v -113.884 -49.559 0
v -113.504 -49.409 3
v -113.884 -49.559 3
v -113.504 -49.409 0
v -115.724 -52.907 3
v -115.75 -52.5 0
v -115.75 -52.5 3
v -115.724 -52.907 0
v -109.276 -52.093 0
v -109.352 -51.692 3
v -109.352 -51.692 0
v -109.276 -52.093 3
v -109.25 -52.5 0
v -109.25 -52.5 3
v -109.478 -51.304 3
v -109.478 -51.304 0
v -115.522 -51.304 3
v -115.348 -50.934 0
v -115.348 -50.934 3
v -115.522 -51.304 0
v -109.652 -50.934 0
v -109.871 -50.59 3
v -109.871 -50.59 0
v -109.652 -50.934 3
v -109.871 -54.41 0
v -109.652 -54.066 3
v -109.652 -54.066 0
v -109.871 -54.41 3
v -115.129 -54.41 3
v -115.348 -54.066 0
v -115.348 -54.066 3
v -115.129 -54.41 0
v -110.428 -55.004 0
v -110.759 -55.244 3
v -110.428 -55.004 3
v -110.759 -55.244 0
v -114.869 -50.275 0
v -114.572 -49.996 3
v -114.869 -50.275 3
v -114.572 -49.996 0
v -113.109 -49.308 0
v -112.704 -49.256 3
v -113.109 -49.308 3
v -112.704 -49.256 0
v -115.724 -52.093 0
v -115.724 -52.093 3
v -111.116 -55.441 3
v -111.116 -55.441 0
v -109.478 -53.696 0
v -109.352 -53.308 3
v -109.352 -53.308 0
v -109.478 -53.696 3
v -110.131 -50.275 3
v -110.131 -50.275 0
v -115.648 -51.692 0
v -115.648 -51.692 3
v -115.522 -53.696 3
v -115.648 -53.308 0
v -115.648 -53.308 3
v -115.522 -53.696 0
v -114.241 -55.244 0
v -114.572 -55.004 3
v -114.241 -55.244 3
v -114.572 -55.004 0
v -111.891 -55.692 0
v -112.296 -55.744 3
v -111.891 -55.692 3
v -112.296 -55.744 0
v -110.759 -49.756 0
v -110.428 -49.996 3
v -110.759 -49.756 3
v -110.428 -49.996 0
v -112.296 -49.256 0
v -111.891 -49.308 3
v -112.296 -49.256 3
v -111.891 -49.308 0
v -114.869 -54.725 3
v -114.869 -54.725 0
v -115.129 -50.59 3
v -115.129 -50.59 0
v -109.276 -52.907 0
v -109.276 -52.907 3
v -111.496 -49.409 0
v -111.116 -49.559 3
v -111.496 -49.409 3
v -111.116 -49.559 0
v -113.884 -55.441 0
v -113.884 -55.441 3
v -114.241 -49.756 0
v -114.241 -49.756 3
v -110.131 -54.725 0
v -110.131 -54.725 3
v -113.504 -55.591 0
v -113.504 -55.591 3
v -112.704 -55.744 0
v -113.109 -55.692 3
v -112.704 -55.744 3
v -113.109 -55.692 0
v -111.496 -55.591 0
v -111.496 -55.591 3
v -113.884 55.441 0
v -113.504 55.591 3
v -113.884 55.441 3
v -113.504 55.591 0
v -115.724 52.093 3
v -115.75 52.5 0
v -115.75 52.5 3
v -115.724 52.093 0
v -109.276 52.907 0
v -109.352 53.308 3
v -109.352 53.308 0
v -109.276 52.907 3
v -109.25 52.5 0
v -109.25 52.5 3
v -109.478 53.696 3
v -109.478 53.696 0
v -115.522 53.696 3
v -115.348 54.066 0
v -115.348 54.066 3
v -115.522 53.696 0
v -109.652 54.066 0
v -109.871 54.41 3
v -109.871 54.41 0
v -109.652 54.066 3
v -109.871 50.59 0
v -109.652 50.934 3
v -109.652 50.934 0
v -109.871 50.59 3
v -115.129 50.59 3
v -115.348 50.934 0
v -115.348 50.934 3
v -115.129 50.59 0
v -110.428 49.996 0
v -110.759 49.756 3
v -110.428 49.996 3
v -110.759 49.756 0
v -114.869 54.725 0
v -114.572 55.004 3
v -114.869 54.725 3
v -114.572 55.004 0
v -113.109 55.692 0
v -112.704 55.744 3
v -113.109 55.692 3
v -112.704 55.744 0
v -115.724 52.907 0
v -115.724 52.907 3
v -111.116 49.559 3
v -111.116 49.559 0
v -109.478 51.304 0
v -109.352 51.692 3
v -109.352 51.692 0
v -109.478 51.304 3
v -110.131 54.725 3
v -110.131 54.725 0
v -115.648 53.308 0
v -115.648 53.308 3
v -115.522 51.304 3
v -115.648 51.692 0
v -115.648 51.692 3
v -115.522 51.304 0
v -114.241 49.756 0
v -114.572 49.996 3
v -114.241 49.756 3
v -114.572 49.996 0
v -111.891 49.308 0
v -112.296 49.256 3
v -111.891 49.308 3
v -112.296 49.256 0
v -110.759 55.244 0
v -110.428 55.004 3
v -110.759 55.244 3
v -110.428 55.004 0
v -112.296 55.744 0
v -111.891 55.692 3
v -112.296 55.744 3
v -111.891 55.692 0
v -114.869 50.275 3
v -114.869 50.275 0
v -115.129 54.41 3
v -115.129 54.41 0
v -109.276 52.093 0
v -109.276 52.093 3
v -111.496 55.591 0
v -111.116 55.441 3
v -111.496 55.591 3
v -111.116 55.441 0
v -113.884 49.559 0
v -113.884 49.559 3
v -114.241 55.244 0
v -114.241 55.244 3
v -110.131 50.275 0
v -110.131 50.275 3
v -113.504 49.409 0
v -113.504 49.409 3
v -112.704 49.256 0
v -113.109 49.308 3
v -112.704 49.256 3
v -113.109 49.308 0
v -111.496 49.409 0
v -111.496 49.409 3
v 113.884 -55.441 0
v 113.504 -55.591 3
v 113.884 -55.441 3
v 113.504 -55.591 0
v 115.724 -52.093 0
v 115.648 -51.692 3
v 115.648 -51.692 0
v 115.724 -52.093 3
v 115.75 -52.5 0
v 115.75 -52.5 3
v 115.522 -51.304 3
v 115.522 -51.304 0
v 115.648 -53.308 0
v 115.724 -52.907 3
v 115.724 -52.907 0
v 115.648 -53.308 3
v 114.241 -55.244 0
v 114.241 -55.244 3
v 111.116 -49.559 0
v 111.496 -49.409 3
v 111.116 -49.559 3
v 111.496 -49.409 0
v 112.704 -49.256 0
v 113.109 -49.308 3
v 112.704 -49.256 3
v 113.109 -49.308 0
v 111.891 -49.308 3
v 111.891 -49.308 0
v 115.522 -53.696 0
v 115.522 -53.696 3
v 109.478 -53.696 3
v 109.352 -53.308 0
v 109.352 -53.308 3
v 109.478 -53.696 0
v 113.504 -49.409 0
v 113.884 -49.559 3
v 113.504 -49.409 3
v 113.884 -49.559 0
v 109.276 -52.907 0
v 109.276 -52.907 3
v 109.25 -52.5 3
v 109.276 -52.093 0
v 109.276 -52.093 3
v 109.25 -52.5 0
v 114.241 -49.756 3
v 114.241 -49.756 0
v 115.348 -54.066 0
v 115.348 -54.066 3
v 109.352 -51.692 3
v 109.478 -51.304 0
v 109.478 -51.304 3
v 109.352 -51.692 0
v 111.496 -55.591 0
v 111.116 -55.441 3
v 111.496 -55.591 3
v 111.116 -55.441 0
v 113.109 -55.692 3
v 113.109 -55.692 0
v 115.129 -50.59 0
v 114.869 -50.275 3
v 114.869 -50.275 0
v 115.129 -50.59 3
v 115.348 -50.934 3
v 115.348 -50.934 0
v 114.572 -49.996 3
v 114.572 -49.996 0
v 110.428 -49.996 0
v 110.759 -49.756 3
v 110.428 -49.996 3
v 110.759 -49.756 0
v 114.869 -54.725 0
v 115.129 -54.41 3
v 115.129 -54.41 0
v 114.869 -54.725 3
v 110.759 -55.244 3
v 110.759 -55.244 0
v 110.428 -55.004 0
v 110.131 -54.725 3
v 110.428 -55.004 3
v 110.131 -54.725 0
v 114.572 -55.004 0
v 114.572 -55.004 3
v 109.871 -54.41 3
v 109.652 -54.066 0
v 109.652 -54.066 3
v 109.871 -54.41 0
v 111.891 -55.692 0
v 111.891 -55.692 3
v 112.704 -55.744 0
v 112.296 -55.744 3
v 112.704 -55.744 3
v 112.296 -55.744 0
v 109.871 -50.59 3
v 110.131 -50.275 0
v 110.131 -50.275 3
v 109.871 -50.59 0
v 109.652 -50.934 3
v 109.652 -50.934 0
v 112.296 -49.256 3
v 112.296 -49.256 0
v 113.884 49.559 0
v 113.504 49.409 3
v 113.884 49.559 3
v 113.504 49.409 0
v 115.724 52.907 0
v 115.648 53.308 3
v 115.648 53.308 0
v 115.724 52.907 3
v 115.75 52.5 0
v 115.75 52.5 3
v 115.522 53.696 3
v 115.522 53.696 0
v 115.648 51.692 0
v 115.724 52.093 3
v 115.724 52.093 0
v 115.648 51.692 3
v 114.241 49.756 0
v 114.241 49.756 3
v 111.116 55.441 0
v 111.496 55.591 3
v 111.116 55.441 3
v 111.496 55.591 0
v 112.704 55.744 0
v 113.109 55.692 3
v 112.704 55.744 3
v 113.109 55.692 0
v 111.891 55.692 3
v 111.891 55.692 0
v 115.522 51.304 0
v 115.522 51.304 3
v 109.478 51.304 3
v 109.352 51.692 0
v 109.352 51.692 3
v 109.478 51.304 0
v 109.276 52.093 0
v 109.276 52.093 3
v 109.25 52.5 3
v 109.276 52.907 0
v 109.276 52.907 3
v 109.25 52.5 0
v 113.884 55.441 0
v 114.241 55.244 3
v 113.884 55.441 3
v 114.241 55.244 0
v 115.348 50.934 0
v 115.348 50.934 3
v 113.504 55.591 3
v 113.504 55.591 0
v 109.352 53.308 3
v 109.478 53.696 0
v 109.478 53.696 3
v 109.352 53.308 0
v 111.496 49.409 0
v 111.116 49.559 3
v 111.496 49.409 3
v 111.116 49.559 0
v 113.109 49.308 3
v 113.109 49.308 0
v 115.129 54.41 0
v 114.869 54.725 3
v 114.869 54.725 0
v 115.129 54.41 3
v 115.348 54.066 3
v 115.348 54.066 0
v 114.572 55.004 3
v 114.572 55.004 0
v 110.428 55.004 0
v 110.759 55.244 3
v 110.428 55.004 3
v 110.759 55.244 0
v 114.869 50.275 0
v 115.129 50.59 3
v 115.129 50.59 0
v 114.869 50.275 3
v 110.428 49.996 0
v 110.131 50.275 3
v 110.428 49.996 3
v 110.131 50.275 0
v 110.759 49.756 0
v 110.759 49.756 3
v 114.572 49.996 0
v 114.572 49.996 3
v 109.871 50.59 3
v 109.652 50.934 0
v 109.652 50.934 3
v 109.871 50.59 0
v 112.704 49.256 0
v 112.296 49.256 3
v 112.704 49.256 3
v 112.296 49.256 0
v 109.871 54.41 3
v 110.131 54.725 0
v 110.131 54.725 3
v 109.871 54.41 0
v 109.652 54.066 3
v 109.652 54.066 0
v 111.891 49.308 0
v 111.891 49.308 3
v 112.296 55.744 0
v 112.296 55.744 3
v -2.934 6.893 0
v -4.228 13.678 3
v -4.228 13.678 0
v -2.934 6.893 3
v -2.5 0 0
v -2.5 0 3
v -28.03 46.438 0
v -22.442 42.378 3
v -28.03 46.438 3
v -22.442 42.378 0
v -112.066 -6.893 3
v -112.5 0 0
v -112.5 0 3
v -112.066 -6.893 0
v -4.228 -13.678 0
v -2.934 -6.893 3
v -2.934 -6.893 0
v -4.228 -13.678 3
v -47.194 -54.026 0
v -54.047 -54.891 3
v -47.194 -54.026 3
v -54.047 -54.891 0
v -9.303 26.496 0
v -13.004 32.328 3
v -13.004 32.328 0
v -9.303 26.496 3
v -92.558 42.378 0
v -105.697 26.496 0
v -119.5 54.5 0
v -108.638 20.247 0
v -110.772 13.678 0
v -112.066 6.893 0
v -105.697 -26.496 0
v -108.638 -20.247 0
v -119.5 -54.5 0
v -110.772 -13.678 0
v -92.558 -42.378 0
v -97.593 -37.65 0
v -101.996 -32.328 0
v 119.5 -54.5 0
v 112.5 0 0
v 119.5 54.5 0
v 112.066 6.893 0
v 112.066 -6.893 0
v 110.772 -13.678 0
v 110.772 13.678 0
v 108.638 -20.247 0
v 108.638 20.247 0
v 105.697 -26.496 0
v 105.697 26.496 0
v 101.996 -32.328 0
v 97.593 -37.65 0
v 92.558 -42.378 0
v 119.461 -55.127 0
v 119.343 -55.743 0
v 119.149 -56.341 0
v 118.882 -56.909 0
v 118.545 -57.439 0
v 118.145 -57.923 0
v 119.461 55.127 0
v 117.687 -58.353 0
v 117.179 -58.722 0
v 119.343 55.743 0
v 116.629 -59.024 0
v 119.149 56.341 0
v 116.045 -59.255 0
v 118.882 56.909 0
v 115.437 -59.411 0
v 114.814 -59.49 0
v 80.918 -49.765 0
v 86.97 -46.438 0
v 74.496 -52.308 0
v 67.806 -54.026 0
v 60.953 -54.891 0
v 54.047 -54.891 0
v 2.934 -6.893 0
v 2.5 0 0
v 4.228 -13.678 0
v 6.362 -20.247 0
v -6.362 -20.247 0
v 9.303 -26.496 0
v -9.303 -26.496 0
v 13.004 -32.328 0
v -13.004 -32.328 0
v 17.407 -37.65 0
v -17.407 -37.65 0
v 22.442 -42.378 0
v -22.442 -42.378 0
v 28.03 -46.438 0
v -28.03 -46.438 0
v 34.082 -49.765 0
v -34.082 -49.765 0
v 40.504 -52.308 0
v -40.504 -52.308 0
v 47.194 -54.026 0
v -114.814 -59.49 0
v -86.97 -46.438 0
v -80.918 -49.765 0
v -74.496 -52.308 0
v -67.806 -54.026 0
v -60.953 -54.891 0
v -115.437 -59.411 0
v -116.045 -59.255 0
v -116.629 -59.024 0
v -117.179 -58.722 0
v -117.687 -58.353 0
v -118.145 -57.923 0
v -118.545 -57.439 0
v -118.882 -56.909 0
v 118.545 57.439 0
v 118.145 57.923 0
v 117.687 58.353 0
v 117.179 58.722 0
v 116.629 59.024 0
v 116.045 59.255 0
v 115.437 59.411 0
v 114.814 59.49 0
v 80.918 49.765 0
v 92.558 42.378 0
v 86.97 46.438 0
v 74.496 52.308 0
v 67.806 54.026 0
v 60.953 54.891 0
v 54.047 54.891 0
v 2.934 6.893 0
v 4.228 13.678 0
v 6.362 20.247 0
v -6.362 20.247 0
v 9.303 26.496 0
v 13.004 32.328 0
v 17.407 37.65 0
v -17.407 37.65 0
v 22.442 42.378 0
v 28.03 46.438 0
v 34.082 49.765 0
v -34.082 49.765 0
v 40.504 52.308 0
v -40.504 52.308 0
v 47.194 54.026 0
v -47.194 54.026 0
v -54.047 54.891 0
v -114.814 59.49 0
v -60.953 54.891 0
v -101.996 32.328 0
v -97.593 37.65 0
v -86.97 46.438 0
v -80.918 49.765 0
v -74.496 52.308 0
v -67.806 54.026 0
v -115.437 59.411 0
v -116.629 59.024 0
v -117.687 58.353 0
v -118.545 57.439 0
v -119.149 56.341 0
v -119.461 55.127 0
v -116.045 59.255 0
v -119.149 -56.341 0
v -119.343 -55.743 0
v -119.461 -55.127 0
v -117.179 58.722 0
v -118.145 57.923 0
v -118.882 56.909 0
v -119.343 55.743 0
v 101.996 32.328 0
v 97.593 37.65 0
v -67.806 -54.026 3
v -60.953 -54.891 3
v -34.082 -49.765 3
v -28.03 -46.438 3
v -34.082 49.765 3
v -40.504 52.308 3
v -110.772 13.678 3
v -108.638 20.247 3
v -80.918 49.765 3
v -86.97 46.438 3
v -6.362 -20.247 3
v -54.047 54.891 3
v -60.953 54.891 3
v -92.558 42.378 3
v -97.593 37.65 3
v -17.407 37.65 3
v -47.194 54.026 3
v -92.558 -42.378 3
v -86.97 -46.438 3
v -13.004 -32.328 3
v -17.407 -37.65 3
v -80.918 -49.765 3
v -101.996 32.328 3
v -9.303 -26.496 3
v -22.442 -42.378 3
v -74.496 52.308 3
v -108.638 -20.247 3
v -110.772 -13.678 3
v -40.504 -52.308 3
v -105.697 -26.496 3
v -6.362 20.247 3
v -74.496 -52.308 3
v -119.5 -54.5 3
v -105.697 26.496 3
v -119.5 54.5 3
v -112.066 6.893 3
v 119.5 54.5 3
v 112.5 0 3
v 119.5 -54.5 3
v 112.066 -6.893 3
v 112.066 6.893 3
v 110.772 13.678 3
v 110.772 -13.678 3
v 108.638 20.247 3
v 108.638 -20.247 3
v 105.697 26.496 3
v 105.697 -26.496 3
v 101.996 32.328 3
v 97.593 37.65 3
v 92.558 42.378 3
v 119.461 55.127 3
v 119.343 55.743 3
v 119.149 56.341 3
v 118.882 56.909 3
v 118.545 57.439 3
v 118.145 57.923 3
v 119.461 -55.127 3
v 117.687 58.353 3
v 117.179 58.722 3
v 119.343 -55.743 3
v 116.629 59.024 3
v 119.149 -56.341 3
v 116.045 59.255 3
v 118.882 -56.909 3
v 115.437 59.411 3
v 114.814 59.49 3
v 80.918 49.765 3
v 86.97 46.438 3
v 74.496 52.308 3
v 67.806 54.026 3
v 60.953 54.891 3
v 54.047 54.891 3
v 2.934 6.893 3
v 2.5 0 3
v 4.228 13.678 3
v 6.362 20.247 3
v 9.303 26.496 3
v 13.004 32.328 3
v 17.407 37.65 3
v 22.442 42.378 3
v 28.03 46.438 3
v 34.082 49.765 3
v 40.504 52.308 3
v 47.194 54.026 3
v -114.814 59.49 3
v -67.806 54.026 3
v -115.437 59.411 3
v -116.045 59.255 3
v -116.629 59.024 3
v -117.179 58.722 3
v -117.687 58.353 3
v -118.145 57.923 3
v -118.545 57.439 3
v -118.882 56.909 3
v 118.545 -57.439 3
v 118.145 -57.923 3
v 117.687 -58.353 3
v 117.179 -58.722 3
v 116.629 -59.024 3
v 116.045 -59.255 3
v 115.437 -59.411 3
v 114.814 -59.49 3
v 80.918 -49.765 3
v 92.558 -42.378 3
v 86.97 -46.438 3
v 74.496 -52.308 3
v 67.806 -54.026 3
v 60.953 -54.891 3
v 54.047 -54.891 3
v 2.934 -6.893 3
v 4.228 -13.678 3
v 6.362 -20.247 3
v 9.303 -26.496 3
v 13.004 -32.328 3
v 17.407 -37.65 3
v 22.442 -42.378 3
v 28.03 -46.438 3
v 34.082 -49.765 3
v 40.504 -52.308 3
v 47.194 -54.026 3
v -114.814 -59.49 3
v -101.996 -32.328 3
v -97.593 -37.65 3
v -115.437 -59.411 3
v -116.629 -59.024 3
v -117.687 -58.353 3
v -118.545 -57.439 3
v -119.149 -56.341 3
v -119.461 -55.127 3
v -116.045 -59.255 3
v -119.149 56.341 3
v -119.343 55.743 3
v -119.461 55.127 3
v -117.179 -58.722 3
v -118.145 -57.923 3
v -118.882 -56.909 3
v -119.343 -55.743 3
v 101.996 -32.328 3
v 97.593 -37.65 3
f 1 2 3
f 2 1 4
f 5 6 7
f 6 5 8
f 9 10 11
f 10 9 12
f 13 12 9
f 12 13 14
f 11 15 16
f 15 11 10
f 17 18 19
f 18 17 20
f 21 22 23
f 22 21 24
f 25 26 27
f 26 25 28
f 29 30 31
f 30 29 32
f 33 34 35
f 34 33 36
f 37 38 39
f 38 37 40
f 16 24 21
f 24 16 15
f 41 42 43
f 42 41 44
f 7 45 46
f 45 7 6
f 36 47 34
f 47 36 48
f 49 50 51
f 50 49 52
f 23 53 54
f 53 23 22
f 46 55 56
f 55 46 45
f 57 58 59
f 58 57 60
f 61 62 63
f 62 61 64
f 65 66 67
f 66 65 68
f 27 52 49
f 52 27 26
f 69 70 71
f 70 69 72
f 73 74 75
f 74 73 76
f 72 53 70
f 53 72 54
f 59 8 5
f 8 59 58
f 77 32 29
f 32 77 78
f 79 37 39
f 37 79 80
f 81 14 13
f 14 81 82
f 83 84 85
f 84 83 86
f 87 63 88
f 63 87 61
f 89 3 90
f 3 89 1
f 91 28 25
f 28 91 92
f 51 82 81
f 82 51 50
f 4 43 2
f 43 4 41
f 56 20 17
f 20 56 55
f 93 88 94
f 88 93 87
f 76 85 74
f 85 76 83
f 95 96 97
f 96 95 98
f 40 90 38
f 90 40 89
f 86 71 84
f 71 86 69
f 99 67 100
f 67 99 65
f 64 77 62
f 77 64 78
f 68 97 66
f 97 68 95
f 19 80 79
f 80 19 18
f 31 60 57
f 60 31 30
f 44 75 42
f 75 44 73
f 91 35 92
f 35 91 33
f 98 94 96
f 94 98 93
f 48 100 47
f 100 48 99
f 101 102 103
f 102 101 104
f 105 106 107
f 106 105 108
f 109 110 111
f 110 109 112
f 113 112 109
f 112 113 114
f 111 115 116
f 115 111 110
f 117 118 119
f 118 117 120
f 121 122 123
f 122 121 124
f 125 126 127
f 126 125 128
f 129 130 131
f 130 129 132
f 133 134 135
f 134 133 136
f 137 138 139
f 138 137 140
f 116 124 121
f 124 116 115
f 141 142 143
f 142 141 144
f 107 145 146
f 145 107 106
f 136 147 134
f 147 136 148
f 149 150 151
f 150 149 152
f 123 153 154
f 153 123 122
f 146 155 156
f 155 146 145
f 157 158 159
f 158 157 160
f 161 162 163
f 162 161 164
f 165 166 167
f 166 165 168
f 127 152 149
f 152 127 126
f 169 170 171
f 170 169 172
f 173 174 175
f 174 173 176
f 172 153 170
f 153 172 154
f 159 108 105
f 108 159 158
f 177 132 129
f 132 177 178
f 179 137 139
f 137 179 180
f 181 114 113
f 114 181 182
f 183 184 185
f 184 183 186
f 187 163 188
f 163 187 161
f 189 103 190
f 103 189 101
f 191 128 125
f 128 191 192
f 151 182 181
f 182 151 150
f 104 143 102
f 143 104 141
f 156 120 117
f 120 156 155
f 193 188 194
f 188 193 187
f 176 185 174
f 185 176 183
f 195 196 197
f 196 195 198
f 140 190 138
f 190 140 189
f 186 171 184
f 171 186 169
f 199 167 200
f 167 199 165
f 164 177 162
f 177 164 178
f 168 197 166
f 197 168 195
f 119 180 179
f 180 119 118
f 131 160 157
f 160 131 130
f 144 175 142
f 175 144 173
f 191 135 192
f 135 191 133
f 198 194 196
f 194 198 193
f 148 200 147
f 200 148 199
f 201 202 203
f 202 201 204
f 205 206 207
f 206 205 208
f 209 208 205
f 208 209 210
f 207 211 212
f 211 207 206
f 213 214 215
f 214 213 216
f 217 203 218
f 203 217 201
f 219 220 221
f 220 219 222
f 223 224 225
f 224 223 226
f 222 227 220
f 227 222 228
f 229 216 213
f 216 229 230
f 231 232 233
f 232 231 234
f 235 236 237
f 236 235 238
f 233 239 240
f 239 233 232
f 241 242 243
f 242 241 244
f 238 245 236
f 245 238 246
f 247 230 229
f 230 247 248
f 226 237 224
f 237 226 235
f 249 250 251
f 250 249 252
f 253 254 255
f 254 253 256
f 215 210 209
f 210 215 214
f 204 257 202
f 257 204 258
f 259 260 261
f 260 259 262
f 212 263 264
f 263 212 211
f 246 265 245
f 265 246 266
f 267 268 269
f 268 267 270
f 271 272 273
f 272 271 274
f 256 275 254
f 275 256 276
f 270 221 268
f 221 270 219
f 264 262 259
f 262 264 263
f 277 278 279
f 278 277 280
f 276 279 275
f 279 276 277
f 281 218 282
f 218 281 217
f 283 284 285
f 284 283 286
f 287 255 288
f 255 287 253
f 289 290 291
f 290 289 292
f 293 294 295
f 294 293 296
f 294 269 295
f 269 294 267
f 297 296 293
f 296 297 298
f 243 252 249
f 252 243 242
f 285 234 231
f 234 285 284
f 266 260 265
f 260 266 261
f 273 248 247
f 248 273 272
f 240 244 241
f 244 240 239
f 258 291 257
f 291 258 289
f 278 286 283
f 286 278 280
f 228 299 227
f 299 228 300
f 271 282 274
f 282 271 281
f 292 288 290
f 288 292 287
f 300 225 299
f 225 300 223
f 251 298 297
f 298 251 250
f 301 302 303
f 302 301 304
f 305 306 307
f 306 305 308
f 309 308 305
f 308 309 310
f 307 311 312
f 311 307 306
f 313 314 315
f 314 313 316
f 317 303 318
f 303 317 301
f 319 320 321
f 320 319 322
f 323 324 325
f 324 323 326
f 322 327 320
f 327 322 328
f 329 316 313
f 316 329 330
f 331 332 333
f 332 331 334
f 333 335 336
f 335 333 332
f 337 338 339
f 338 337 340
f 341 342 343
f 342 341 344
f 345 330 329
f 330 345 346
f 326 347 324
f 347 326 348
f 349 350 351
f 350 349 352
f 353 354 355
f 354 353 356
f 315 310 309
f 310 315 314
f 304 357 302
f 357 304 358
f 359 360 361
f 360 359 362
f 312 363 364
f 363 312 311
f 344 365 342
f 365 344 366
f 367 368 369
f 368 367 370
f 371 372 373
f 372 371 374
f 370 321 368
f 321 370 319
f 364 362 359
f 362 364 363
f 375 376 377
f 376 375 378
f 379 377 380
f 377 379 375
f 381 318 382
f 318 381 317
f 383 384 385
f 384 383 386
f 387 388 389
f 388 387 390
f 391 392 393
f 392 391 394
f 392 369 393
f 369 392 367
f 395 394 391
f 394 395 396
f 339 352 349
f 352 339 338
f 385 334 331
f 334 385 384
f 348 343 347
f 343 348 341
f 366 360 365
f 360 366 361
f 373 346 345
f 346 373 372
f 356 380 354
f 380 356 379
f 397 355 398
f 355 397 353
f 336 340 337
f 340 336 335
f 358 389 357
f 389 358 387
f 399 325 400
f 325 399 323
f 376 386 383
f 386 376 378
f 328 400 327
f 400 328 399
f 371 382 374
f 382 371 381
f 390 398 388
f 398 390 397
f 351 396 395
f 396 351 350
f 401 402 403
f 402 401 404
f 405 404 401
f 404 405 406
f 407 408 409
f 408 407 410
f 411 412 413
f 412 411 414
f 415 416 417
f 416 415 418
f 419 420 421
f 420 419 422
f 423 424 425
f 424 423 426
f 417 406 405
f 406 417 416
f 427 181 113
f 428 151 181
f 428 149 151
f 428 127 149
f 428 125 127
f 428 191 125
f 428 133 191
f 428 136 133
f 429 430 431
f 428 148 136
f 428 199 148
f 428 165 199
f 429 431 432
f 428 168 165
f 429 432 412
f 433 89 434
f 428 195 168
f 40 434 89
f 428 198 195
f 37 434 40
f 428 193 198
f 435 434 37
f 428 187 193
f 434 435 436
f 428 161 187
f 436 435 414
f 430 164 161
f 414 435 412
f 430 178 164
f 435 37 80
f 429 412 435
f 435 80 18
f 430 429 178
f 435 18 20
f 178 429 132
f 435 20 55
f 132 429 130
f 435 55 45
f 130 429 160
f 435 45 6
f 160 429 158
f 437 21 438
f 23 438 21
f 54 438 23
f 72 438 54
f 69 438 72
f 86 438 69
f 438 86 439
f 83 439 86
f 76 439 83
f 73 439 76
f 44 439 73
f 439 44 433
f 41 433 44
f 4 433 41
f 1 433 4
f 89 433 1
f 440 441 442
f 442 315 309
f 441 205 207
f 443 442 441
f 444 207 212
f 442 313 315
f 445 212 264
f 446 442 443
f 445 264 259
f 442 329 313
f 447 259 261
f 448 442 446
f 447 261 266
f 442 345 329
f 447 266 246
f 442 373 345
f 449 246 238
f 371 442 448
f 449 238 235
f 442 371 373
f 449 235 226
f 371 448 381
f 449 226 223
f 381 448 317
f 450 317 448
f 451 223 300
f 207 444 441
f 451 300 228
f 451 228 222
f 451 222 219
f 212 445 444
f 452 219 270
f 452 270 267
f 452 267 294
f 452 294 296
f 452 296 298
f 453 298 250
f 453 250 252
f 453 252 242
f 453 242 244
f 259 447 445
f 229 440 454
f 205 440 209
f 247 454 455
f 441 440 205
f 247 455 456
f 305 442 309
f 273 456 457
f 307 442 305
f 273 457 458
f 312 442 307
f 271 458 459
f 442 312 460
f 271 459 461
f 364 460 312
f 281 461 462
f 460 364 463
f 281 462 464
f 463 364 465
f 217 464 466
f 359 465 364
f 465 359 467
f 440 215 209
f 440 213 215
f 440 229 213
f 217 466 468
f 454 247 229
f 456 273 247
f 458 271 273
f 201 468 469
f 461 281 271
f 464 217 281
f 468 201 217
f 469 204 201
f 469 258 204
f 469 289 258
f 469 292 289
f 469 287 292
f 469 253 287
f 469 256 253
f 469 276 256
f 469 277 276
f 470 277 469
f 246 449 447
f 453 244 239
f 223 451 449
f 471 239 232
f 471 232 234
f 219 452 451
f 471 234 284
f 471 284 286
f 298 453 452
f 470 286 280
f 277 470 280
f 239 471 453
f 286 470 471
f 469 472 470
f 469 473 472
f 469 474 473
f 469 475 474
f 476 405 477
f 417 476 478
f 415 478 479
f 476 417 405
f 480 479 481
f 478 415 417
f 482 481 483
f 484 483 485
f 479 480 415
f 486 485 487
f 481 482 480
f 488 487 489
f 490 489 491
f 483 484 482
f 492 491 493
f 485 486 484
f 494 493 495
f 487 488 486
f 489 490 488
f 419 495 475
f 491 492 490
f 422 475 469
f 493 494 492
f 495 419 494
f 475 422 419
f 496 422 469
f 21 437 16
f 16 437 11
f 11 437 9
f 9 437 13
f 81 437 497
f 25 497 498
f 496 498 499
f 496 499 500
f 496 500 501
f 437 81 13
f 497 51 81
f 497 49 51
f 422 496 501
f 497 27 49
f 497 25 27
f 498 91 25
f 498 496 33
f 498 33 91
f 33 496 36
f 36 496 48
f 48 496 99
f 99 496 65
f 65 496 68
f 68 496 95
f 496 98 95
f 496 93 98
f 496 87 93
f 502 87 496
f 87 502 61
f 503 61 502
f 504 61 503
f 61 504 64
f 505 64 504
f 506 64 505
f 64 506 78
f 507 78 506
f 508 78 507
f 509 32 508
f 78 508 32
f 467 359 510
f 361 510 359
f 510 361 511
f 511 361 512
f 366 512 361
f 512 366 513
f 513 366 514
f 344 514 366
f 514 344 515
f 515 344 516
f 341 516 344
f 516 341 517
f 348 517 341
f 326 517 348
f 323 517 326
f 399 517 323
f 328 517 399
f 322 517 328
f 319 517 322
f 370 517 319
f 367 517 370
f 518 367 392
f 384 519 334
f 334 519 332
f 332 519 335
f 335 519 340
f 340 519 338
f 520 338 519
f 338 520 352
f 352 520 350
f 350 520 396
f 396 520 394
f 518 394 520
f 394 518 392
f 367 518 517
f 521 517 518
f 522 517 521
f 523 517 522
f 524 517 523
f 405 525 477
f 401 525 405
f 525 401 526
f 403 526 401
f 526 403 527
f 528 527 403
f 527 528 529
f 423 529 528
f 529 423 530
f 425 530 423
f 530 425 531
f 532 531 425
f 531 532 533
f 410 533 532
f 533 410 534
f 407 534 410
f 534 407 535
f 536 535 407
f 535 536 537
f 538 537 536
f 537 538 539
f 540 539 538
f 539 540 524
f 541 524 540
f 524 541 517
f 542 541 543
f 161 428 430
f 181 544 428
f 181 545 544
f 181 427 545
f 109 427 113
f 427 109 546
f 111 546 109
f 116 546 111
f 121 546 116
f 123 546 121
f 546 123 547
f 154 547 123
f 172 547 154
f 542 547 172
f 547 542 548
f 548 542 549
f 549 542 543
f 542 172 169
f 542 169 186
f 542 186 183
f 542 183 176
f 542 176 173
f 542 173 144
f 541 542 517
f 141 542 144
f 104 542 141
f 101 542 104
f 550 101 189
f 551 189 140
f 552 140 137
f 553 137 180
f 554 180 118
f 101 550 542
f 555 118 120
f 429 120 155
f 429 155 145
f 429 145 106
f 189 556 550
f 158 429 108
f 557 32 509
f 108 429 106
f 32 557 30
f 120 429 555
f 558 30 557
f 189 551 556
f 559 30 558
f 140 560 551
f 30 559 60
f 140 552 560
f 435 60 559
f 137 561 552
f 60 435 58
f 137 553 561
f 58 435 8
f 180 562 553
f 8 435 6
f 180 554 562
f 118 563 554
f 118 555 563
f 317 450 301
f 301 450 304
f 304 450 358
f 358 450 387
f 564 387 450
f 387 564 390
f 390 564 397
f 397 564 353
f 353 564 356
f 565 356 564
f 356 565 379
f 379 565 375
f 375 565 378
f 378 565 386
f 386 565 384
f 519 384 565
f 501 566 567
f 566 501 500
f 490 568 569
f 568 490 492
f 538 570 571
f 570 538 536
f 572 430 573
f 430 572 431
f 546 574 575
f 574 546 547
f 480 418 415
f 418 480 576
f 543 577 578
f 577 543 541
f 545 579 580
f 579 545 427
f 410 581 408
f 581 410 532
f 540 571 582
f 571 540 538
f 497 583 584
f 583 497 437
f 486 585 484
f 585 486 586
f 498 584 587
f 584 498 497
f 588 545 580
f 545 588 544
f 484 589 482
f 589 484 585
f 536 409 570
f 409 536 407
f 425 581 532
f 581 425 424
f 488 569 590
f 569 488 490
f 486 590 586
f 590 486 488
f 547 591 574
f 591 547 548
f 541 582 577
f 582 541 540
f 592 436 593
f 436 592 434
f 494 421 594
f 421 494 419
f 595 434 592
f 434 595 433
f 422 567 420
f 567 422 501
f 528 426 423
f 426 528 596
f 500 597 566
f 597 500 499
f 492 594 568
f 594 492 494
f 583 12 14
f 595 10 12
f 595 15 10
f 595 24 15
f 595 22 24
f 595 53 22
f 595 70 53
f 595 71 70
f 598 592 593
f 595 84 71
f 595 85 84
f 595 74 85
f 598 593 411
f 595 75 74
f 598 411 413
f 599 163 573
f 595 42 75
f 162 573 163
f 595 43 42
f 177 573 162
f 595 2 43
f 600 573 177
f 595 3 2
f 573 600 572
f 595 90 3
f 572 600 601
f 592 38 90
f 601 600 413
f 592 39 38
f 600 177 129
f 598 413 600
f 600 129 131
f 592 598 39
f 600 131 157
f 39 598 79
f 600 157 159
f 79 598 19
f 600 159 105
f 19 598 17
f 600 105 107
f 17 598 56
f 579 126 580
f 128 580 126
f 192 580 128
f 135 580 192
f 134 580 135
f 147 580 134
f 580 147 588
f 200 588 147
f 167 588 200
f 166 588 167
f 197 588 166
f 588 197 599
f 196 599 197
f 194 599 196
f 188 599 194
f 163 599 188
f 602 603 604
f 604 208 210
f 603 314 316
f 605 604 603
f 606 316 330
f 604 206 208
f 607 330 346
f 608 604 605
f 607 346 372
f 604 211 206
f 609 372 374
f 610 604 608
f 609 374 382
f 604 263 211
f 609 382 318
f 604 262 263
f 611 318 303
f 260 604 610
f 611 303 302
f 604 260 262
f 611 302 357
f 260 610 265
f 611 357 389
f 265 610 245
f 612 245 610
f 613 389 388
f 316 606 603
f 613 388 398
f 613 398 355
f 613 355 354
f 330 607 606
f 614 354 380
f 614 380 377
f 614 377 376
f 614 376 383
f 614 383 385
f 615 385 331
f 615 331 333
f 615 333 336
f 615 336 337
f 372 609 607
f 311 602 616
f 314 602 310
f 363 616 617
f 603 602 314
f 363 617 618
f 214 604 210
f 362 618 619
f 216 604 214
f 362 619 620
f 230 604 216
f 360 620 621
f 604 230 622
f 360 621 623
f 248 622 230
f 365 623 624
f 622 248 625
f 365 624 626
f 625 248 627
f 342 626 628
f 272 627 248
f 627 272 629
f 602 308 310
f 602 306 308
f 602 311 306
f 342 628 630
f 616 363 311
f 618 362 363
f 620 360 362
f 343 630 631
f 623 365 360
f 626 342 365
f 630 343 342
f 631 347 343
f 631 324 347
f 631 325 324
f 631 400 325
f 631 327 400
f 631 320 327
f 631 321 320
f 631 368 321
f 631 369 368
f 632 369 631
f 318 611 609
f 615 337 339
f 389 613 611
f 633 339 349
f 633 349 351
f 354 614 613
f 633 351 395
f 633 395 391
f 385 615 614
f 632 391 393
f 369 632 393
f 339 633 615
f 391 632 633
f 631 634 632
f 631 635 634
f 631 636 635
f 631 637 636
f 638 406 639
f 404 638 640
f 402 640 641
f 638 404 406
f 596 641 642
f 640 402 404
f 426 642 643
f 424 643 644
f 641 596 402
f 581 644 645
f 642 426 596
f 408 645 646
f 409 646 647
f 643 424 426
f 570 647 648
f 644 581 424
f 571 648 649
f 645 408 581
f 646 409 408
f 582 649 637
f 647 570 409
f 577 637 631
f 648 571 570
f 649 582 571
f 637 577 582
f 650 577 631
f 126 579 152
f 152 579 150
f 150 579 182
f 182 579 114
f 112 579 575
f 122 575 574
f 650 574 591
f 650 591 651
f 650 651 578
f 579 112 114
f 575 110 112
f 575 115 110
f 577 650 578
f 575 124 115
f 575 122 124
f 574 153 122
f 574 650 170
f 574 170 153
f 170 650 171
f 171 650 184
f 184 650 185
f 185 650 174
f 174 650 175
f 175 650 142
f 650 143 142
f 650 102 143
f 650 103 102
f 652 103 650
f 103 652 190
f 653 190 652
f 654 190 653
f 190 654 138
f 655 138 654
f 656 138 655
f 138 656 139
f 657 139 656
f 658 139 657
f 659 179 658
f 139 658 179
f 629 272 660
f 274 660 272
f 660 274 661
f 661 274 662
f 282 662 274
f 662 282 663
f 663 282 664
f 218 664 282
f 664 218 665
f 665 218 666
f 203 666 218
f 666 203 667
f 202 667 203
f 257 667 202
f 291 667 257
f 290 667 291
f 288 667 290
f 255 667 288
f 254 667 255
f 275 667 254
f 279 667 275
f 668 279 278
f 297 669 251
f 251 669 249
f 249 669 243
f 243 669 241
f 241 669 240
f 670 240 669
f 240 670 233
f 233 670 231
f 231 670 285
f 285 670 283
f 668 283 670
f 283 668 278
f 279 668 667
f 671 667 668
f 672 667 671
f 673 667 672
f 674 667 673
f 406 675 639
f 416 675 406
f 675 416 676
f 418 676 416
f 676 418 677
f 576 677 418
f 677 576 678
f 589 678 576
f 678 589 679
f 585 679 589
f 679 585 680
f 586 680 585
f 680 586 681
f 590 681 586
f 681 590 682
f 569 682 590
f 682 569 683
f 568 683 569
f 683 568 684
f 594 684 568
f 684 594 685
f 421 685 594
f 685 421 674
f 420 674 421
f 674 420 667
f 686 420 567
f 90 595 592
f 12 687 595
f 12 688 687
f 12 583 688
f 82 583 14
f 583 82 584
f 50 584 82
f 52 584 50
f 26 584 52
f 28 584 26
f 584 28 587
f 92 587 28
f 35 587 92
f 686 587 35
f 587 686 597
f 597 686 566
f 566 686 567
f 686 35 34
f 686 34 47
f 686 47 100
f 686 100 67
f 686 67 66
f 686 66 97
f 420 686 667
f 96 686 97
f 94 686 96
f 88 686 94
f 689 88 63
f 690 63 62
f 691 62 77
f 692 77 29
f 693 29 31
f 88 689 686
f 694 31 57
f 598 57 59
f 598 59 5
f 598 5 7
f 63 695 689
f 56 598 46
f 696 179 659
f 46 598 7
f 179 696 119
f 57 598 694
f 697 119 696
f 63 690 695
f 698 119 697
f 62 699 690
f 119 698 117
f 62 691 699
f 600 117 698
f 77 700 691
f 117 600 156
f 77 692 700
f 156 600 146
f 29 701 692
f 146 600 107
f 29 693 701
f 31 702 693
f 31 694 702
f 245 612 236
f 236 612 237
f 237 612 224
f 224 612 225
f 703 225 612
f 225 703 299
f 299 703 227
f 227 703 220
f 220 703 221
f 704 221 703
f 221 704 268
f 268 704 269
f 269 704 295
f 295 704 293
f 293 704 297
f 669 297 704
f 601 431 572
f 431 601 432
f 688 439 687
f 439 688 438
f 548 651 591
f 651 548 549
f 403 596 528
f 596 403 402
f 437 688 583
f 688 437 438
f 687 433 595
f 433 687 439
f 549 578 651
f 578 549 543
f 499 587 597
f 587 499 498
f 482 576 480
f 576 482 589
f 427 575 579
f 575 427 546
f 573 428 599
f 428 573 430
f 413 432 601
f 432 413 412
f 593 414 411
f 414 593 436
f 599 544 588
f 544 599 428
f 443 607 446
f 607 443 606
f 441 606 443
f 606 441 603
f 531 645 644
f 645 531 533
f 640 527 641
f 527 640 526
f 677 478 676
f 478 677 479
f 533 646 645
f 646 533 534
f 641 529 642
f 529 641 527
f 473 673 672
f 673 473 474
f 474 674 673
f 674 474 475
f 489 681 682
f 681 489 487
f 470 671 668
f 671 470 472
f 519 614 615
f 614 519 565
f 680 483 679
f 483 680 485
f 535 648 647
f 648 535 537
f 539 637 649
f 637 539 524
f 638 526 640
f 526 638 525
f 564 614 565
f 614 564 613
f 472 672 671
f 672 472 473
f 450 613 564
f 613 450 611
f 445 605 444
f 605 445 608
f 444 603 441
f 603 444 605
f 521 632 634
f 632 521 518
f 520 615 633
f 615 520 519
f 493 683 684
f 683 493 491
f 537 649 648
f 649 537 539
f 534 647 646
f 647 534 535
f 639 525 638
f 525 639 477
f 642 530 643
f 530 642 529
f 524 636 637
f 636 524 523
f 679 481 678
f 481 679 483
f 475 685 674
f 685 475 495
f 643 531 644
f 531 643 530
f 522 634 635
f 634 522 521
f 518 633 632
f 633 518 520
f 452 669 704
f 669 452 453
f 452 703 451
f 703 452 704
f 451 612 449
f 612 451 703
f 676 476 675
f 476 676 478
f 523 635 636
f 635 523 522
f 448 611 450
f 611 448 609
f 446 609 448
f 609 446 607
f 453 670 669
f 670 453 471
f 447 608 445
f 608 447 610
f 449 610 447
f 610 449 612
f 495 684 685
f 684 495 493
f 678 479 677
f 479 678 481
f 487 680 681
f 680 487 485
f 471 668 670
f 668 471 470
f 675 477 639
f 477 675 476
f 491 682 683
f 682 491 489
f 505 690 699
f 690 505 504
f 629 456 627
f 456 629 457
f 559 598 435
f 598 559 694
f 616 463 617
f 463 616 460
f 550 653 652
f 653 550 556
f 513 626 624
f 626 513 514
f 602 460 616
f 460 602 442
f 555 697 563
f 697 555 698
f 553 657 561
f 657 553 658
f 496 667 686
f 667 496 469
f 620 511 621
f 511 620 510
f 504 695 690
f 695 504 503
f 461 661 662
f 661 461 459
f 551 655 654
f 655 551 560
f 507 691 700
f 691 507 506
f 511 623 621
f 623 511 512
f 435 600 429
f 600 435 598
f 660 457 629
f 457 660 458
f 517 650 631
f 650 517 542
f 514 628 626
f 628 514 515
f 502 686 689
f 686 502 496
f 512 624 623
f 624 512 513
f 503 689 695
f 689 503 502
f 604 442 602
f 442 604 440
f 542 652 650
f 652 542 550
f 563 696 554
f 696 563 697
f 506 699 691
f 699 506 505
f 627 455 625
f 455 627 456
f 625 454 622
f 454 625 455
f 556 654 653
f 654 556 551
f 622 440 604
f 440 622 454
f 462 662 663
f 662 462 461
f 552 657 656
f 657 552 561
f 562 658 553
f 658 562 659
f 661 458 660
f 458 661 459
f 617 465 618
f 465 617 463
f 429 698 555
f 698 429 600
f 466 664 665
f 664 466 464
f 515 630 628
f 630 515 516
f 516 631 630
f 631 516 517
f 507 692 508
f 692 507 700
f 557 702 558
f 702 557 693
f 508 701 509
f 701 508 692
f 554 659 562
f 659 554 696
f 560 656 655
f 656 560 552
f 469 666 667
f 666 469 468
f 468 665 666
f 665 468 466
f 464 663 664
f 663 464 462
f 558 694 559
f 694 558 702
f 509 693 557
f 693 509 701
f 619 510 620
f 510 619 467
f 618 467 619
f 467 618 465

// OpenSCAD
$fn = 50;


difference() {
	union() {
		hull() {
			translate(v = [-114.5000000000, 54.5000000000, 0]) {
				cylinder(h = 3, r = 5);
			}
			translate(v = [114.5000000000, 54.5000000000, 0]) {
				cylinder(h = 3, r = 5);
			}
			translate(v = [-114.5000000000, -54.5000000000, 0]) {
				cylinder(h = 3, r = 5);
			}
			translate(v = [114.5000000000, -54.5000000000, 0]) {
				cylinder(h = 3, r = 5);
			}
		}
	}
	union() {
		#translate(v = [-112.5000000000, -52.5000000000, -100.0000000000]) {
			cylinder(h = 200, r = 3.2500000000);
		}
		#translate(v = [-112.5000000000, 52.5000000000, -100.0000000000]) {
			cylinder(h = 200, r = 3.2500000000);
		}
		#translate(v = [112.5000000000, -52.5000000000, -100.0000000000]) {
			cylinder(h = 200, r = 3.2500000000);
		}
		#translate(v = [112.5000000000, 52.5000000000, -100.0000000000]) {
			cylinder(h = 200, r = 3.2500000000);
		}
		#translate(v = [-57.5000000000, 0, 0]) {
			cylinder(h = 3, r = 55.0000000000);
		}
		#translate(v = [57.5000000000, 0, 0]) {
			cylinder(h = 3, r = 55.0000000000);
		}
	}
}
